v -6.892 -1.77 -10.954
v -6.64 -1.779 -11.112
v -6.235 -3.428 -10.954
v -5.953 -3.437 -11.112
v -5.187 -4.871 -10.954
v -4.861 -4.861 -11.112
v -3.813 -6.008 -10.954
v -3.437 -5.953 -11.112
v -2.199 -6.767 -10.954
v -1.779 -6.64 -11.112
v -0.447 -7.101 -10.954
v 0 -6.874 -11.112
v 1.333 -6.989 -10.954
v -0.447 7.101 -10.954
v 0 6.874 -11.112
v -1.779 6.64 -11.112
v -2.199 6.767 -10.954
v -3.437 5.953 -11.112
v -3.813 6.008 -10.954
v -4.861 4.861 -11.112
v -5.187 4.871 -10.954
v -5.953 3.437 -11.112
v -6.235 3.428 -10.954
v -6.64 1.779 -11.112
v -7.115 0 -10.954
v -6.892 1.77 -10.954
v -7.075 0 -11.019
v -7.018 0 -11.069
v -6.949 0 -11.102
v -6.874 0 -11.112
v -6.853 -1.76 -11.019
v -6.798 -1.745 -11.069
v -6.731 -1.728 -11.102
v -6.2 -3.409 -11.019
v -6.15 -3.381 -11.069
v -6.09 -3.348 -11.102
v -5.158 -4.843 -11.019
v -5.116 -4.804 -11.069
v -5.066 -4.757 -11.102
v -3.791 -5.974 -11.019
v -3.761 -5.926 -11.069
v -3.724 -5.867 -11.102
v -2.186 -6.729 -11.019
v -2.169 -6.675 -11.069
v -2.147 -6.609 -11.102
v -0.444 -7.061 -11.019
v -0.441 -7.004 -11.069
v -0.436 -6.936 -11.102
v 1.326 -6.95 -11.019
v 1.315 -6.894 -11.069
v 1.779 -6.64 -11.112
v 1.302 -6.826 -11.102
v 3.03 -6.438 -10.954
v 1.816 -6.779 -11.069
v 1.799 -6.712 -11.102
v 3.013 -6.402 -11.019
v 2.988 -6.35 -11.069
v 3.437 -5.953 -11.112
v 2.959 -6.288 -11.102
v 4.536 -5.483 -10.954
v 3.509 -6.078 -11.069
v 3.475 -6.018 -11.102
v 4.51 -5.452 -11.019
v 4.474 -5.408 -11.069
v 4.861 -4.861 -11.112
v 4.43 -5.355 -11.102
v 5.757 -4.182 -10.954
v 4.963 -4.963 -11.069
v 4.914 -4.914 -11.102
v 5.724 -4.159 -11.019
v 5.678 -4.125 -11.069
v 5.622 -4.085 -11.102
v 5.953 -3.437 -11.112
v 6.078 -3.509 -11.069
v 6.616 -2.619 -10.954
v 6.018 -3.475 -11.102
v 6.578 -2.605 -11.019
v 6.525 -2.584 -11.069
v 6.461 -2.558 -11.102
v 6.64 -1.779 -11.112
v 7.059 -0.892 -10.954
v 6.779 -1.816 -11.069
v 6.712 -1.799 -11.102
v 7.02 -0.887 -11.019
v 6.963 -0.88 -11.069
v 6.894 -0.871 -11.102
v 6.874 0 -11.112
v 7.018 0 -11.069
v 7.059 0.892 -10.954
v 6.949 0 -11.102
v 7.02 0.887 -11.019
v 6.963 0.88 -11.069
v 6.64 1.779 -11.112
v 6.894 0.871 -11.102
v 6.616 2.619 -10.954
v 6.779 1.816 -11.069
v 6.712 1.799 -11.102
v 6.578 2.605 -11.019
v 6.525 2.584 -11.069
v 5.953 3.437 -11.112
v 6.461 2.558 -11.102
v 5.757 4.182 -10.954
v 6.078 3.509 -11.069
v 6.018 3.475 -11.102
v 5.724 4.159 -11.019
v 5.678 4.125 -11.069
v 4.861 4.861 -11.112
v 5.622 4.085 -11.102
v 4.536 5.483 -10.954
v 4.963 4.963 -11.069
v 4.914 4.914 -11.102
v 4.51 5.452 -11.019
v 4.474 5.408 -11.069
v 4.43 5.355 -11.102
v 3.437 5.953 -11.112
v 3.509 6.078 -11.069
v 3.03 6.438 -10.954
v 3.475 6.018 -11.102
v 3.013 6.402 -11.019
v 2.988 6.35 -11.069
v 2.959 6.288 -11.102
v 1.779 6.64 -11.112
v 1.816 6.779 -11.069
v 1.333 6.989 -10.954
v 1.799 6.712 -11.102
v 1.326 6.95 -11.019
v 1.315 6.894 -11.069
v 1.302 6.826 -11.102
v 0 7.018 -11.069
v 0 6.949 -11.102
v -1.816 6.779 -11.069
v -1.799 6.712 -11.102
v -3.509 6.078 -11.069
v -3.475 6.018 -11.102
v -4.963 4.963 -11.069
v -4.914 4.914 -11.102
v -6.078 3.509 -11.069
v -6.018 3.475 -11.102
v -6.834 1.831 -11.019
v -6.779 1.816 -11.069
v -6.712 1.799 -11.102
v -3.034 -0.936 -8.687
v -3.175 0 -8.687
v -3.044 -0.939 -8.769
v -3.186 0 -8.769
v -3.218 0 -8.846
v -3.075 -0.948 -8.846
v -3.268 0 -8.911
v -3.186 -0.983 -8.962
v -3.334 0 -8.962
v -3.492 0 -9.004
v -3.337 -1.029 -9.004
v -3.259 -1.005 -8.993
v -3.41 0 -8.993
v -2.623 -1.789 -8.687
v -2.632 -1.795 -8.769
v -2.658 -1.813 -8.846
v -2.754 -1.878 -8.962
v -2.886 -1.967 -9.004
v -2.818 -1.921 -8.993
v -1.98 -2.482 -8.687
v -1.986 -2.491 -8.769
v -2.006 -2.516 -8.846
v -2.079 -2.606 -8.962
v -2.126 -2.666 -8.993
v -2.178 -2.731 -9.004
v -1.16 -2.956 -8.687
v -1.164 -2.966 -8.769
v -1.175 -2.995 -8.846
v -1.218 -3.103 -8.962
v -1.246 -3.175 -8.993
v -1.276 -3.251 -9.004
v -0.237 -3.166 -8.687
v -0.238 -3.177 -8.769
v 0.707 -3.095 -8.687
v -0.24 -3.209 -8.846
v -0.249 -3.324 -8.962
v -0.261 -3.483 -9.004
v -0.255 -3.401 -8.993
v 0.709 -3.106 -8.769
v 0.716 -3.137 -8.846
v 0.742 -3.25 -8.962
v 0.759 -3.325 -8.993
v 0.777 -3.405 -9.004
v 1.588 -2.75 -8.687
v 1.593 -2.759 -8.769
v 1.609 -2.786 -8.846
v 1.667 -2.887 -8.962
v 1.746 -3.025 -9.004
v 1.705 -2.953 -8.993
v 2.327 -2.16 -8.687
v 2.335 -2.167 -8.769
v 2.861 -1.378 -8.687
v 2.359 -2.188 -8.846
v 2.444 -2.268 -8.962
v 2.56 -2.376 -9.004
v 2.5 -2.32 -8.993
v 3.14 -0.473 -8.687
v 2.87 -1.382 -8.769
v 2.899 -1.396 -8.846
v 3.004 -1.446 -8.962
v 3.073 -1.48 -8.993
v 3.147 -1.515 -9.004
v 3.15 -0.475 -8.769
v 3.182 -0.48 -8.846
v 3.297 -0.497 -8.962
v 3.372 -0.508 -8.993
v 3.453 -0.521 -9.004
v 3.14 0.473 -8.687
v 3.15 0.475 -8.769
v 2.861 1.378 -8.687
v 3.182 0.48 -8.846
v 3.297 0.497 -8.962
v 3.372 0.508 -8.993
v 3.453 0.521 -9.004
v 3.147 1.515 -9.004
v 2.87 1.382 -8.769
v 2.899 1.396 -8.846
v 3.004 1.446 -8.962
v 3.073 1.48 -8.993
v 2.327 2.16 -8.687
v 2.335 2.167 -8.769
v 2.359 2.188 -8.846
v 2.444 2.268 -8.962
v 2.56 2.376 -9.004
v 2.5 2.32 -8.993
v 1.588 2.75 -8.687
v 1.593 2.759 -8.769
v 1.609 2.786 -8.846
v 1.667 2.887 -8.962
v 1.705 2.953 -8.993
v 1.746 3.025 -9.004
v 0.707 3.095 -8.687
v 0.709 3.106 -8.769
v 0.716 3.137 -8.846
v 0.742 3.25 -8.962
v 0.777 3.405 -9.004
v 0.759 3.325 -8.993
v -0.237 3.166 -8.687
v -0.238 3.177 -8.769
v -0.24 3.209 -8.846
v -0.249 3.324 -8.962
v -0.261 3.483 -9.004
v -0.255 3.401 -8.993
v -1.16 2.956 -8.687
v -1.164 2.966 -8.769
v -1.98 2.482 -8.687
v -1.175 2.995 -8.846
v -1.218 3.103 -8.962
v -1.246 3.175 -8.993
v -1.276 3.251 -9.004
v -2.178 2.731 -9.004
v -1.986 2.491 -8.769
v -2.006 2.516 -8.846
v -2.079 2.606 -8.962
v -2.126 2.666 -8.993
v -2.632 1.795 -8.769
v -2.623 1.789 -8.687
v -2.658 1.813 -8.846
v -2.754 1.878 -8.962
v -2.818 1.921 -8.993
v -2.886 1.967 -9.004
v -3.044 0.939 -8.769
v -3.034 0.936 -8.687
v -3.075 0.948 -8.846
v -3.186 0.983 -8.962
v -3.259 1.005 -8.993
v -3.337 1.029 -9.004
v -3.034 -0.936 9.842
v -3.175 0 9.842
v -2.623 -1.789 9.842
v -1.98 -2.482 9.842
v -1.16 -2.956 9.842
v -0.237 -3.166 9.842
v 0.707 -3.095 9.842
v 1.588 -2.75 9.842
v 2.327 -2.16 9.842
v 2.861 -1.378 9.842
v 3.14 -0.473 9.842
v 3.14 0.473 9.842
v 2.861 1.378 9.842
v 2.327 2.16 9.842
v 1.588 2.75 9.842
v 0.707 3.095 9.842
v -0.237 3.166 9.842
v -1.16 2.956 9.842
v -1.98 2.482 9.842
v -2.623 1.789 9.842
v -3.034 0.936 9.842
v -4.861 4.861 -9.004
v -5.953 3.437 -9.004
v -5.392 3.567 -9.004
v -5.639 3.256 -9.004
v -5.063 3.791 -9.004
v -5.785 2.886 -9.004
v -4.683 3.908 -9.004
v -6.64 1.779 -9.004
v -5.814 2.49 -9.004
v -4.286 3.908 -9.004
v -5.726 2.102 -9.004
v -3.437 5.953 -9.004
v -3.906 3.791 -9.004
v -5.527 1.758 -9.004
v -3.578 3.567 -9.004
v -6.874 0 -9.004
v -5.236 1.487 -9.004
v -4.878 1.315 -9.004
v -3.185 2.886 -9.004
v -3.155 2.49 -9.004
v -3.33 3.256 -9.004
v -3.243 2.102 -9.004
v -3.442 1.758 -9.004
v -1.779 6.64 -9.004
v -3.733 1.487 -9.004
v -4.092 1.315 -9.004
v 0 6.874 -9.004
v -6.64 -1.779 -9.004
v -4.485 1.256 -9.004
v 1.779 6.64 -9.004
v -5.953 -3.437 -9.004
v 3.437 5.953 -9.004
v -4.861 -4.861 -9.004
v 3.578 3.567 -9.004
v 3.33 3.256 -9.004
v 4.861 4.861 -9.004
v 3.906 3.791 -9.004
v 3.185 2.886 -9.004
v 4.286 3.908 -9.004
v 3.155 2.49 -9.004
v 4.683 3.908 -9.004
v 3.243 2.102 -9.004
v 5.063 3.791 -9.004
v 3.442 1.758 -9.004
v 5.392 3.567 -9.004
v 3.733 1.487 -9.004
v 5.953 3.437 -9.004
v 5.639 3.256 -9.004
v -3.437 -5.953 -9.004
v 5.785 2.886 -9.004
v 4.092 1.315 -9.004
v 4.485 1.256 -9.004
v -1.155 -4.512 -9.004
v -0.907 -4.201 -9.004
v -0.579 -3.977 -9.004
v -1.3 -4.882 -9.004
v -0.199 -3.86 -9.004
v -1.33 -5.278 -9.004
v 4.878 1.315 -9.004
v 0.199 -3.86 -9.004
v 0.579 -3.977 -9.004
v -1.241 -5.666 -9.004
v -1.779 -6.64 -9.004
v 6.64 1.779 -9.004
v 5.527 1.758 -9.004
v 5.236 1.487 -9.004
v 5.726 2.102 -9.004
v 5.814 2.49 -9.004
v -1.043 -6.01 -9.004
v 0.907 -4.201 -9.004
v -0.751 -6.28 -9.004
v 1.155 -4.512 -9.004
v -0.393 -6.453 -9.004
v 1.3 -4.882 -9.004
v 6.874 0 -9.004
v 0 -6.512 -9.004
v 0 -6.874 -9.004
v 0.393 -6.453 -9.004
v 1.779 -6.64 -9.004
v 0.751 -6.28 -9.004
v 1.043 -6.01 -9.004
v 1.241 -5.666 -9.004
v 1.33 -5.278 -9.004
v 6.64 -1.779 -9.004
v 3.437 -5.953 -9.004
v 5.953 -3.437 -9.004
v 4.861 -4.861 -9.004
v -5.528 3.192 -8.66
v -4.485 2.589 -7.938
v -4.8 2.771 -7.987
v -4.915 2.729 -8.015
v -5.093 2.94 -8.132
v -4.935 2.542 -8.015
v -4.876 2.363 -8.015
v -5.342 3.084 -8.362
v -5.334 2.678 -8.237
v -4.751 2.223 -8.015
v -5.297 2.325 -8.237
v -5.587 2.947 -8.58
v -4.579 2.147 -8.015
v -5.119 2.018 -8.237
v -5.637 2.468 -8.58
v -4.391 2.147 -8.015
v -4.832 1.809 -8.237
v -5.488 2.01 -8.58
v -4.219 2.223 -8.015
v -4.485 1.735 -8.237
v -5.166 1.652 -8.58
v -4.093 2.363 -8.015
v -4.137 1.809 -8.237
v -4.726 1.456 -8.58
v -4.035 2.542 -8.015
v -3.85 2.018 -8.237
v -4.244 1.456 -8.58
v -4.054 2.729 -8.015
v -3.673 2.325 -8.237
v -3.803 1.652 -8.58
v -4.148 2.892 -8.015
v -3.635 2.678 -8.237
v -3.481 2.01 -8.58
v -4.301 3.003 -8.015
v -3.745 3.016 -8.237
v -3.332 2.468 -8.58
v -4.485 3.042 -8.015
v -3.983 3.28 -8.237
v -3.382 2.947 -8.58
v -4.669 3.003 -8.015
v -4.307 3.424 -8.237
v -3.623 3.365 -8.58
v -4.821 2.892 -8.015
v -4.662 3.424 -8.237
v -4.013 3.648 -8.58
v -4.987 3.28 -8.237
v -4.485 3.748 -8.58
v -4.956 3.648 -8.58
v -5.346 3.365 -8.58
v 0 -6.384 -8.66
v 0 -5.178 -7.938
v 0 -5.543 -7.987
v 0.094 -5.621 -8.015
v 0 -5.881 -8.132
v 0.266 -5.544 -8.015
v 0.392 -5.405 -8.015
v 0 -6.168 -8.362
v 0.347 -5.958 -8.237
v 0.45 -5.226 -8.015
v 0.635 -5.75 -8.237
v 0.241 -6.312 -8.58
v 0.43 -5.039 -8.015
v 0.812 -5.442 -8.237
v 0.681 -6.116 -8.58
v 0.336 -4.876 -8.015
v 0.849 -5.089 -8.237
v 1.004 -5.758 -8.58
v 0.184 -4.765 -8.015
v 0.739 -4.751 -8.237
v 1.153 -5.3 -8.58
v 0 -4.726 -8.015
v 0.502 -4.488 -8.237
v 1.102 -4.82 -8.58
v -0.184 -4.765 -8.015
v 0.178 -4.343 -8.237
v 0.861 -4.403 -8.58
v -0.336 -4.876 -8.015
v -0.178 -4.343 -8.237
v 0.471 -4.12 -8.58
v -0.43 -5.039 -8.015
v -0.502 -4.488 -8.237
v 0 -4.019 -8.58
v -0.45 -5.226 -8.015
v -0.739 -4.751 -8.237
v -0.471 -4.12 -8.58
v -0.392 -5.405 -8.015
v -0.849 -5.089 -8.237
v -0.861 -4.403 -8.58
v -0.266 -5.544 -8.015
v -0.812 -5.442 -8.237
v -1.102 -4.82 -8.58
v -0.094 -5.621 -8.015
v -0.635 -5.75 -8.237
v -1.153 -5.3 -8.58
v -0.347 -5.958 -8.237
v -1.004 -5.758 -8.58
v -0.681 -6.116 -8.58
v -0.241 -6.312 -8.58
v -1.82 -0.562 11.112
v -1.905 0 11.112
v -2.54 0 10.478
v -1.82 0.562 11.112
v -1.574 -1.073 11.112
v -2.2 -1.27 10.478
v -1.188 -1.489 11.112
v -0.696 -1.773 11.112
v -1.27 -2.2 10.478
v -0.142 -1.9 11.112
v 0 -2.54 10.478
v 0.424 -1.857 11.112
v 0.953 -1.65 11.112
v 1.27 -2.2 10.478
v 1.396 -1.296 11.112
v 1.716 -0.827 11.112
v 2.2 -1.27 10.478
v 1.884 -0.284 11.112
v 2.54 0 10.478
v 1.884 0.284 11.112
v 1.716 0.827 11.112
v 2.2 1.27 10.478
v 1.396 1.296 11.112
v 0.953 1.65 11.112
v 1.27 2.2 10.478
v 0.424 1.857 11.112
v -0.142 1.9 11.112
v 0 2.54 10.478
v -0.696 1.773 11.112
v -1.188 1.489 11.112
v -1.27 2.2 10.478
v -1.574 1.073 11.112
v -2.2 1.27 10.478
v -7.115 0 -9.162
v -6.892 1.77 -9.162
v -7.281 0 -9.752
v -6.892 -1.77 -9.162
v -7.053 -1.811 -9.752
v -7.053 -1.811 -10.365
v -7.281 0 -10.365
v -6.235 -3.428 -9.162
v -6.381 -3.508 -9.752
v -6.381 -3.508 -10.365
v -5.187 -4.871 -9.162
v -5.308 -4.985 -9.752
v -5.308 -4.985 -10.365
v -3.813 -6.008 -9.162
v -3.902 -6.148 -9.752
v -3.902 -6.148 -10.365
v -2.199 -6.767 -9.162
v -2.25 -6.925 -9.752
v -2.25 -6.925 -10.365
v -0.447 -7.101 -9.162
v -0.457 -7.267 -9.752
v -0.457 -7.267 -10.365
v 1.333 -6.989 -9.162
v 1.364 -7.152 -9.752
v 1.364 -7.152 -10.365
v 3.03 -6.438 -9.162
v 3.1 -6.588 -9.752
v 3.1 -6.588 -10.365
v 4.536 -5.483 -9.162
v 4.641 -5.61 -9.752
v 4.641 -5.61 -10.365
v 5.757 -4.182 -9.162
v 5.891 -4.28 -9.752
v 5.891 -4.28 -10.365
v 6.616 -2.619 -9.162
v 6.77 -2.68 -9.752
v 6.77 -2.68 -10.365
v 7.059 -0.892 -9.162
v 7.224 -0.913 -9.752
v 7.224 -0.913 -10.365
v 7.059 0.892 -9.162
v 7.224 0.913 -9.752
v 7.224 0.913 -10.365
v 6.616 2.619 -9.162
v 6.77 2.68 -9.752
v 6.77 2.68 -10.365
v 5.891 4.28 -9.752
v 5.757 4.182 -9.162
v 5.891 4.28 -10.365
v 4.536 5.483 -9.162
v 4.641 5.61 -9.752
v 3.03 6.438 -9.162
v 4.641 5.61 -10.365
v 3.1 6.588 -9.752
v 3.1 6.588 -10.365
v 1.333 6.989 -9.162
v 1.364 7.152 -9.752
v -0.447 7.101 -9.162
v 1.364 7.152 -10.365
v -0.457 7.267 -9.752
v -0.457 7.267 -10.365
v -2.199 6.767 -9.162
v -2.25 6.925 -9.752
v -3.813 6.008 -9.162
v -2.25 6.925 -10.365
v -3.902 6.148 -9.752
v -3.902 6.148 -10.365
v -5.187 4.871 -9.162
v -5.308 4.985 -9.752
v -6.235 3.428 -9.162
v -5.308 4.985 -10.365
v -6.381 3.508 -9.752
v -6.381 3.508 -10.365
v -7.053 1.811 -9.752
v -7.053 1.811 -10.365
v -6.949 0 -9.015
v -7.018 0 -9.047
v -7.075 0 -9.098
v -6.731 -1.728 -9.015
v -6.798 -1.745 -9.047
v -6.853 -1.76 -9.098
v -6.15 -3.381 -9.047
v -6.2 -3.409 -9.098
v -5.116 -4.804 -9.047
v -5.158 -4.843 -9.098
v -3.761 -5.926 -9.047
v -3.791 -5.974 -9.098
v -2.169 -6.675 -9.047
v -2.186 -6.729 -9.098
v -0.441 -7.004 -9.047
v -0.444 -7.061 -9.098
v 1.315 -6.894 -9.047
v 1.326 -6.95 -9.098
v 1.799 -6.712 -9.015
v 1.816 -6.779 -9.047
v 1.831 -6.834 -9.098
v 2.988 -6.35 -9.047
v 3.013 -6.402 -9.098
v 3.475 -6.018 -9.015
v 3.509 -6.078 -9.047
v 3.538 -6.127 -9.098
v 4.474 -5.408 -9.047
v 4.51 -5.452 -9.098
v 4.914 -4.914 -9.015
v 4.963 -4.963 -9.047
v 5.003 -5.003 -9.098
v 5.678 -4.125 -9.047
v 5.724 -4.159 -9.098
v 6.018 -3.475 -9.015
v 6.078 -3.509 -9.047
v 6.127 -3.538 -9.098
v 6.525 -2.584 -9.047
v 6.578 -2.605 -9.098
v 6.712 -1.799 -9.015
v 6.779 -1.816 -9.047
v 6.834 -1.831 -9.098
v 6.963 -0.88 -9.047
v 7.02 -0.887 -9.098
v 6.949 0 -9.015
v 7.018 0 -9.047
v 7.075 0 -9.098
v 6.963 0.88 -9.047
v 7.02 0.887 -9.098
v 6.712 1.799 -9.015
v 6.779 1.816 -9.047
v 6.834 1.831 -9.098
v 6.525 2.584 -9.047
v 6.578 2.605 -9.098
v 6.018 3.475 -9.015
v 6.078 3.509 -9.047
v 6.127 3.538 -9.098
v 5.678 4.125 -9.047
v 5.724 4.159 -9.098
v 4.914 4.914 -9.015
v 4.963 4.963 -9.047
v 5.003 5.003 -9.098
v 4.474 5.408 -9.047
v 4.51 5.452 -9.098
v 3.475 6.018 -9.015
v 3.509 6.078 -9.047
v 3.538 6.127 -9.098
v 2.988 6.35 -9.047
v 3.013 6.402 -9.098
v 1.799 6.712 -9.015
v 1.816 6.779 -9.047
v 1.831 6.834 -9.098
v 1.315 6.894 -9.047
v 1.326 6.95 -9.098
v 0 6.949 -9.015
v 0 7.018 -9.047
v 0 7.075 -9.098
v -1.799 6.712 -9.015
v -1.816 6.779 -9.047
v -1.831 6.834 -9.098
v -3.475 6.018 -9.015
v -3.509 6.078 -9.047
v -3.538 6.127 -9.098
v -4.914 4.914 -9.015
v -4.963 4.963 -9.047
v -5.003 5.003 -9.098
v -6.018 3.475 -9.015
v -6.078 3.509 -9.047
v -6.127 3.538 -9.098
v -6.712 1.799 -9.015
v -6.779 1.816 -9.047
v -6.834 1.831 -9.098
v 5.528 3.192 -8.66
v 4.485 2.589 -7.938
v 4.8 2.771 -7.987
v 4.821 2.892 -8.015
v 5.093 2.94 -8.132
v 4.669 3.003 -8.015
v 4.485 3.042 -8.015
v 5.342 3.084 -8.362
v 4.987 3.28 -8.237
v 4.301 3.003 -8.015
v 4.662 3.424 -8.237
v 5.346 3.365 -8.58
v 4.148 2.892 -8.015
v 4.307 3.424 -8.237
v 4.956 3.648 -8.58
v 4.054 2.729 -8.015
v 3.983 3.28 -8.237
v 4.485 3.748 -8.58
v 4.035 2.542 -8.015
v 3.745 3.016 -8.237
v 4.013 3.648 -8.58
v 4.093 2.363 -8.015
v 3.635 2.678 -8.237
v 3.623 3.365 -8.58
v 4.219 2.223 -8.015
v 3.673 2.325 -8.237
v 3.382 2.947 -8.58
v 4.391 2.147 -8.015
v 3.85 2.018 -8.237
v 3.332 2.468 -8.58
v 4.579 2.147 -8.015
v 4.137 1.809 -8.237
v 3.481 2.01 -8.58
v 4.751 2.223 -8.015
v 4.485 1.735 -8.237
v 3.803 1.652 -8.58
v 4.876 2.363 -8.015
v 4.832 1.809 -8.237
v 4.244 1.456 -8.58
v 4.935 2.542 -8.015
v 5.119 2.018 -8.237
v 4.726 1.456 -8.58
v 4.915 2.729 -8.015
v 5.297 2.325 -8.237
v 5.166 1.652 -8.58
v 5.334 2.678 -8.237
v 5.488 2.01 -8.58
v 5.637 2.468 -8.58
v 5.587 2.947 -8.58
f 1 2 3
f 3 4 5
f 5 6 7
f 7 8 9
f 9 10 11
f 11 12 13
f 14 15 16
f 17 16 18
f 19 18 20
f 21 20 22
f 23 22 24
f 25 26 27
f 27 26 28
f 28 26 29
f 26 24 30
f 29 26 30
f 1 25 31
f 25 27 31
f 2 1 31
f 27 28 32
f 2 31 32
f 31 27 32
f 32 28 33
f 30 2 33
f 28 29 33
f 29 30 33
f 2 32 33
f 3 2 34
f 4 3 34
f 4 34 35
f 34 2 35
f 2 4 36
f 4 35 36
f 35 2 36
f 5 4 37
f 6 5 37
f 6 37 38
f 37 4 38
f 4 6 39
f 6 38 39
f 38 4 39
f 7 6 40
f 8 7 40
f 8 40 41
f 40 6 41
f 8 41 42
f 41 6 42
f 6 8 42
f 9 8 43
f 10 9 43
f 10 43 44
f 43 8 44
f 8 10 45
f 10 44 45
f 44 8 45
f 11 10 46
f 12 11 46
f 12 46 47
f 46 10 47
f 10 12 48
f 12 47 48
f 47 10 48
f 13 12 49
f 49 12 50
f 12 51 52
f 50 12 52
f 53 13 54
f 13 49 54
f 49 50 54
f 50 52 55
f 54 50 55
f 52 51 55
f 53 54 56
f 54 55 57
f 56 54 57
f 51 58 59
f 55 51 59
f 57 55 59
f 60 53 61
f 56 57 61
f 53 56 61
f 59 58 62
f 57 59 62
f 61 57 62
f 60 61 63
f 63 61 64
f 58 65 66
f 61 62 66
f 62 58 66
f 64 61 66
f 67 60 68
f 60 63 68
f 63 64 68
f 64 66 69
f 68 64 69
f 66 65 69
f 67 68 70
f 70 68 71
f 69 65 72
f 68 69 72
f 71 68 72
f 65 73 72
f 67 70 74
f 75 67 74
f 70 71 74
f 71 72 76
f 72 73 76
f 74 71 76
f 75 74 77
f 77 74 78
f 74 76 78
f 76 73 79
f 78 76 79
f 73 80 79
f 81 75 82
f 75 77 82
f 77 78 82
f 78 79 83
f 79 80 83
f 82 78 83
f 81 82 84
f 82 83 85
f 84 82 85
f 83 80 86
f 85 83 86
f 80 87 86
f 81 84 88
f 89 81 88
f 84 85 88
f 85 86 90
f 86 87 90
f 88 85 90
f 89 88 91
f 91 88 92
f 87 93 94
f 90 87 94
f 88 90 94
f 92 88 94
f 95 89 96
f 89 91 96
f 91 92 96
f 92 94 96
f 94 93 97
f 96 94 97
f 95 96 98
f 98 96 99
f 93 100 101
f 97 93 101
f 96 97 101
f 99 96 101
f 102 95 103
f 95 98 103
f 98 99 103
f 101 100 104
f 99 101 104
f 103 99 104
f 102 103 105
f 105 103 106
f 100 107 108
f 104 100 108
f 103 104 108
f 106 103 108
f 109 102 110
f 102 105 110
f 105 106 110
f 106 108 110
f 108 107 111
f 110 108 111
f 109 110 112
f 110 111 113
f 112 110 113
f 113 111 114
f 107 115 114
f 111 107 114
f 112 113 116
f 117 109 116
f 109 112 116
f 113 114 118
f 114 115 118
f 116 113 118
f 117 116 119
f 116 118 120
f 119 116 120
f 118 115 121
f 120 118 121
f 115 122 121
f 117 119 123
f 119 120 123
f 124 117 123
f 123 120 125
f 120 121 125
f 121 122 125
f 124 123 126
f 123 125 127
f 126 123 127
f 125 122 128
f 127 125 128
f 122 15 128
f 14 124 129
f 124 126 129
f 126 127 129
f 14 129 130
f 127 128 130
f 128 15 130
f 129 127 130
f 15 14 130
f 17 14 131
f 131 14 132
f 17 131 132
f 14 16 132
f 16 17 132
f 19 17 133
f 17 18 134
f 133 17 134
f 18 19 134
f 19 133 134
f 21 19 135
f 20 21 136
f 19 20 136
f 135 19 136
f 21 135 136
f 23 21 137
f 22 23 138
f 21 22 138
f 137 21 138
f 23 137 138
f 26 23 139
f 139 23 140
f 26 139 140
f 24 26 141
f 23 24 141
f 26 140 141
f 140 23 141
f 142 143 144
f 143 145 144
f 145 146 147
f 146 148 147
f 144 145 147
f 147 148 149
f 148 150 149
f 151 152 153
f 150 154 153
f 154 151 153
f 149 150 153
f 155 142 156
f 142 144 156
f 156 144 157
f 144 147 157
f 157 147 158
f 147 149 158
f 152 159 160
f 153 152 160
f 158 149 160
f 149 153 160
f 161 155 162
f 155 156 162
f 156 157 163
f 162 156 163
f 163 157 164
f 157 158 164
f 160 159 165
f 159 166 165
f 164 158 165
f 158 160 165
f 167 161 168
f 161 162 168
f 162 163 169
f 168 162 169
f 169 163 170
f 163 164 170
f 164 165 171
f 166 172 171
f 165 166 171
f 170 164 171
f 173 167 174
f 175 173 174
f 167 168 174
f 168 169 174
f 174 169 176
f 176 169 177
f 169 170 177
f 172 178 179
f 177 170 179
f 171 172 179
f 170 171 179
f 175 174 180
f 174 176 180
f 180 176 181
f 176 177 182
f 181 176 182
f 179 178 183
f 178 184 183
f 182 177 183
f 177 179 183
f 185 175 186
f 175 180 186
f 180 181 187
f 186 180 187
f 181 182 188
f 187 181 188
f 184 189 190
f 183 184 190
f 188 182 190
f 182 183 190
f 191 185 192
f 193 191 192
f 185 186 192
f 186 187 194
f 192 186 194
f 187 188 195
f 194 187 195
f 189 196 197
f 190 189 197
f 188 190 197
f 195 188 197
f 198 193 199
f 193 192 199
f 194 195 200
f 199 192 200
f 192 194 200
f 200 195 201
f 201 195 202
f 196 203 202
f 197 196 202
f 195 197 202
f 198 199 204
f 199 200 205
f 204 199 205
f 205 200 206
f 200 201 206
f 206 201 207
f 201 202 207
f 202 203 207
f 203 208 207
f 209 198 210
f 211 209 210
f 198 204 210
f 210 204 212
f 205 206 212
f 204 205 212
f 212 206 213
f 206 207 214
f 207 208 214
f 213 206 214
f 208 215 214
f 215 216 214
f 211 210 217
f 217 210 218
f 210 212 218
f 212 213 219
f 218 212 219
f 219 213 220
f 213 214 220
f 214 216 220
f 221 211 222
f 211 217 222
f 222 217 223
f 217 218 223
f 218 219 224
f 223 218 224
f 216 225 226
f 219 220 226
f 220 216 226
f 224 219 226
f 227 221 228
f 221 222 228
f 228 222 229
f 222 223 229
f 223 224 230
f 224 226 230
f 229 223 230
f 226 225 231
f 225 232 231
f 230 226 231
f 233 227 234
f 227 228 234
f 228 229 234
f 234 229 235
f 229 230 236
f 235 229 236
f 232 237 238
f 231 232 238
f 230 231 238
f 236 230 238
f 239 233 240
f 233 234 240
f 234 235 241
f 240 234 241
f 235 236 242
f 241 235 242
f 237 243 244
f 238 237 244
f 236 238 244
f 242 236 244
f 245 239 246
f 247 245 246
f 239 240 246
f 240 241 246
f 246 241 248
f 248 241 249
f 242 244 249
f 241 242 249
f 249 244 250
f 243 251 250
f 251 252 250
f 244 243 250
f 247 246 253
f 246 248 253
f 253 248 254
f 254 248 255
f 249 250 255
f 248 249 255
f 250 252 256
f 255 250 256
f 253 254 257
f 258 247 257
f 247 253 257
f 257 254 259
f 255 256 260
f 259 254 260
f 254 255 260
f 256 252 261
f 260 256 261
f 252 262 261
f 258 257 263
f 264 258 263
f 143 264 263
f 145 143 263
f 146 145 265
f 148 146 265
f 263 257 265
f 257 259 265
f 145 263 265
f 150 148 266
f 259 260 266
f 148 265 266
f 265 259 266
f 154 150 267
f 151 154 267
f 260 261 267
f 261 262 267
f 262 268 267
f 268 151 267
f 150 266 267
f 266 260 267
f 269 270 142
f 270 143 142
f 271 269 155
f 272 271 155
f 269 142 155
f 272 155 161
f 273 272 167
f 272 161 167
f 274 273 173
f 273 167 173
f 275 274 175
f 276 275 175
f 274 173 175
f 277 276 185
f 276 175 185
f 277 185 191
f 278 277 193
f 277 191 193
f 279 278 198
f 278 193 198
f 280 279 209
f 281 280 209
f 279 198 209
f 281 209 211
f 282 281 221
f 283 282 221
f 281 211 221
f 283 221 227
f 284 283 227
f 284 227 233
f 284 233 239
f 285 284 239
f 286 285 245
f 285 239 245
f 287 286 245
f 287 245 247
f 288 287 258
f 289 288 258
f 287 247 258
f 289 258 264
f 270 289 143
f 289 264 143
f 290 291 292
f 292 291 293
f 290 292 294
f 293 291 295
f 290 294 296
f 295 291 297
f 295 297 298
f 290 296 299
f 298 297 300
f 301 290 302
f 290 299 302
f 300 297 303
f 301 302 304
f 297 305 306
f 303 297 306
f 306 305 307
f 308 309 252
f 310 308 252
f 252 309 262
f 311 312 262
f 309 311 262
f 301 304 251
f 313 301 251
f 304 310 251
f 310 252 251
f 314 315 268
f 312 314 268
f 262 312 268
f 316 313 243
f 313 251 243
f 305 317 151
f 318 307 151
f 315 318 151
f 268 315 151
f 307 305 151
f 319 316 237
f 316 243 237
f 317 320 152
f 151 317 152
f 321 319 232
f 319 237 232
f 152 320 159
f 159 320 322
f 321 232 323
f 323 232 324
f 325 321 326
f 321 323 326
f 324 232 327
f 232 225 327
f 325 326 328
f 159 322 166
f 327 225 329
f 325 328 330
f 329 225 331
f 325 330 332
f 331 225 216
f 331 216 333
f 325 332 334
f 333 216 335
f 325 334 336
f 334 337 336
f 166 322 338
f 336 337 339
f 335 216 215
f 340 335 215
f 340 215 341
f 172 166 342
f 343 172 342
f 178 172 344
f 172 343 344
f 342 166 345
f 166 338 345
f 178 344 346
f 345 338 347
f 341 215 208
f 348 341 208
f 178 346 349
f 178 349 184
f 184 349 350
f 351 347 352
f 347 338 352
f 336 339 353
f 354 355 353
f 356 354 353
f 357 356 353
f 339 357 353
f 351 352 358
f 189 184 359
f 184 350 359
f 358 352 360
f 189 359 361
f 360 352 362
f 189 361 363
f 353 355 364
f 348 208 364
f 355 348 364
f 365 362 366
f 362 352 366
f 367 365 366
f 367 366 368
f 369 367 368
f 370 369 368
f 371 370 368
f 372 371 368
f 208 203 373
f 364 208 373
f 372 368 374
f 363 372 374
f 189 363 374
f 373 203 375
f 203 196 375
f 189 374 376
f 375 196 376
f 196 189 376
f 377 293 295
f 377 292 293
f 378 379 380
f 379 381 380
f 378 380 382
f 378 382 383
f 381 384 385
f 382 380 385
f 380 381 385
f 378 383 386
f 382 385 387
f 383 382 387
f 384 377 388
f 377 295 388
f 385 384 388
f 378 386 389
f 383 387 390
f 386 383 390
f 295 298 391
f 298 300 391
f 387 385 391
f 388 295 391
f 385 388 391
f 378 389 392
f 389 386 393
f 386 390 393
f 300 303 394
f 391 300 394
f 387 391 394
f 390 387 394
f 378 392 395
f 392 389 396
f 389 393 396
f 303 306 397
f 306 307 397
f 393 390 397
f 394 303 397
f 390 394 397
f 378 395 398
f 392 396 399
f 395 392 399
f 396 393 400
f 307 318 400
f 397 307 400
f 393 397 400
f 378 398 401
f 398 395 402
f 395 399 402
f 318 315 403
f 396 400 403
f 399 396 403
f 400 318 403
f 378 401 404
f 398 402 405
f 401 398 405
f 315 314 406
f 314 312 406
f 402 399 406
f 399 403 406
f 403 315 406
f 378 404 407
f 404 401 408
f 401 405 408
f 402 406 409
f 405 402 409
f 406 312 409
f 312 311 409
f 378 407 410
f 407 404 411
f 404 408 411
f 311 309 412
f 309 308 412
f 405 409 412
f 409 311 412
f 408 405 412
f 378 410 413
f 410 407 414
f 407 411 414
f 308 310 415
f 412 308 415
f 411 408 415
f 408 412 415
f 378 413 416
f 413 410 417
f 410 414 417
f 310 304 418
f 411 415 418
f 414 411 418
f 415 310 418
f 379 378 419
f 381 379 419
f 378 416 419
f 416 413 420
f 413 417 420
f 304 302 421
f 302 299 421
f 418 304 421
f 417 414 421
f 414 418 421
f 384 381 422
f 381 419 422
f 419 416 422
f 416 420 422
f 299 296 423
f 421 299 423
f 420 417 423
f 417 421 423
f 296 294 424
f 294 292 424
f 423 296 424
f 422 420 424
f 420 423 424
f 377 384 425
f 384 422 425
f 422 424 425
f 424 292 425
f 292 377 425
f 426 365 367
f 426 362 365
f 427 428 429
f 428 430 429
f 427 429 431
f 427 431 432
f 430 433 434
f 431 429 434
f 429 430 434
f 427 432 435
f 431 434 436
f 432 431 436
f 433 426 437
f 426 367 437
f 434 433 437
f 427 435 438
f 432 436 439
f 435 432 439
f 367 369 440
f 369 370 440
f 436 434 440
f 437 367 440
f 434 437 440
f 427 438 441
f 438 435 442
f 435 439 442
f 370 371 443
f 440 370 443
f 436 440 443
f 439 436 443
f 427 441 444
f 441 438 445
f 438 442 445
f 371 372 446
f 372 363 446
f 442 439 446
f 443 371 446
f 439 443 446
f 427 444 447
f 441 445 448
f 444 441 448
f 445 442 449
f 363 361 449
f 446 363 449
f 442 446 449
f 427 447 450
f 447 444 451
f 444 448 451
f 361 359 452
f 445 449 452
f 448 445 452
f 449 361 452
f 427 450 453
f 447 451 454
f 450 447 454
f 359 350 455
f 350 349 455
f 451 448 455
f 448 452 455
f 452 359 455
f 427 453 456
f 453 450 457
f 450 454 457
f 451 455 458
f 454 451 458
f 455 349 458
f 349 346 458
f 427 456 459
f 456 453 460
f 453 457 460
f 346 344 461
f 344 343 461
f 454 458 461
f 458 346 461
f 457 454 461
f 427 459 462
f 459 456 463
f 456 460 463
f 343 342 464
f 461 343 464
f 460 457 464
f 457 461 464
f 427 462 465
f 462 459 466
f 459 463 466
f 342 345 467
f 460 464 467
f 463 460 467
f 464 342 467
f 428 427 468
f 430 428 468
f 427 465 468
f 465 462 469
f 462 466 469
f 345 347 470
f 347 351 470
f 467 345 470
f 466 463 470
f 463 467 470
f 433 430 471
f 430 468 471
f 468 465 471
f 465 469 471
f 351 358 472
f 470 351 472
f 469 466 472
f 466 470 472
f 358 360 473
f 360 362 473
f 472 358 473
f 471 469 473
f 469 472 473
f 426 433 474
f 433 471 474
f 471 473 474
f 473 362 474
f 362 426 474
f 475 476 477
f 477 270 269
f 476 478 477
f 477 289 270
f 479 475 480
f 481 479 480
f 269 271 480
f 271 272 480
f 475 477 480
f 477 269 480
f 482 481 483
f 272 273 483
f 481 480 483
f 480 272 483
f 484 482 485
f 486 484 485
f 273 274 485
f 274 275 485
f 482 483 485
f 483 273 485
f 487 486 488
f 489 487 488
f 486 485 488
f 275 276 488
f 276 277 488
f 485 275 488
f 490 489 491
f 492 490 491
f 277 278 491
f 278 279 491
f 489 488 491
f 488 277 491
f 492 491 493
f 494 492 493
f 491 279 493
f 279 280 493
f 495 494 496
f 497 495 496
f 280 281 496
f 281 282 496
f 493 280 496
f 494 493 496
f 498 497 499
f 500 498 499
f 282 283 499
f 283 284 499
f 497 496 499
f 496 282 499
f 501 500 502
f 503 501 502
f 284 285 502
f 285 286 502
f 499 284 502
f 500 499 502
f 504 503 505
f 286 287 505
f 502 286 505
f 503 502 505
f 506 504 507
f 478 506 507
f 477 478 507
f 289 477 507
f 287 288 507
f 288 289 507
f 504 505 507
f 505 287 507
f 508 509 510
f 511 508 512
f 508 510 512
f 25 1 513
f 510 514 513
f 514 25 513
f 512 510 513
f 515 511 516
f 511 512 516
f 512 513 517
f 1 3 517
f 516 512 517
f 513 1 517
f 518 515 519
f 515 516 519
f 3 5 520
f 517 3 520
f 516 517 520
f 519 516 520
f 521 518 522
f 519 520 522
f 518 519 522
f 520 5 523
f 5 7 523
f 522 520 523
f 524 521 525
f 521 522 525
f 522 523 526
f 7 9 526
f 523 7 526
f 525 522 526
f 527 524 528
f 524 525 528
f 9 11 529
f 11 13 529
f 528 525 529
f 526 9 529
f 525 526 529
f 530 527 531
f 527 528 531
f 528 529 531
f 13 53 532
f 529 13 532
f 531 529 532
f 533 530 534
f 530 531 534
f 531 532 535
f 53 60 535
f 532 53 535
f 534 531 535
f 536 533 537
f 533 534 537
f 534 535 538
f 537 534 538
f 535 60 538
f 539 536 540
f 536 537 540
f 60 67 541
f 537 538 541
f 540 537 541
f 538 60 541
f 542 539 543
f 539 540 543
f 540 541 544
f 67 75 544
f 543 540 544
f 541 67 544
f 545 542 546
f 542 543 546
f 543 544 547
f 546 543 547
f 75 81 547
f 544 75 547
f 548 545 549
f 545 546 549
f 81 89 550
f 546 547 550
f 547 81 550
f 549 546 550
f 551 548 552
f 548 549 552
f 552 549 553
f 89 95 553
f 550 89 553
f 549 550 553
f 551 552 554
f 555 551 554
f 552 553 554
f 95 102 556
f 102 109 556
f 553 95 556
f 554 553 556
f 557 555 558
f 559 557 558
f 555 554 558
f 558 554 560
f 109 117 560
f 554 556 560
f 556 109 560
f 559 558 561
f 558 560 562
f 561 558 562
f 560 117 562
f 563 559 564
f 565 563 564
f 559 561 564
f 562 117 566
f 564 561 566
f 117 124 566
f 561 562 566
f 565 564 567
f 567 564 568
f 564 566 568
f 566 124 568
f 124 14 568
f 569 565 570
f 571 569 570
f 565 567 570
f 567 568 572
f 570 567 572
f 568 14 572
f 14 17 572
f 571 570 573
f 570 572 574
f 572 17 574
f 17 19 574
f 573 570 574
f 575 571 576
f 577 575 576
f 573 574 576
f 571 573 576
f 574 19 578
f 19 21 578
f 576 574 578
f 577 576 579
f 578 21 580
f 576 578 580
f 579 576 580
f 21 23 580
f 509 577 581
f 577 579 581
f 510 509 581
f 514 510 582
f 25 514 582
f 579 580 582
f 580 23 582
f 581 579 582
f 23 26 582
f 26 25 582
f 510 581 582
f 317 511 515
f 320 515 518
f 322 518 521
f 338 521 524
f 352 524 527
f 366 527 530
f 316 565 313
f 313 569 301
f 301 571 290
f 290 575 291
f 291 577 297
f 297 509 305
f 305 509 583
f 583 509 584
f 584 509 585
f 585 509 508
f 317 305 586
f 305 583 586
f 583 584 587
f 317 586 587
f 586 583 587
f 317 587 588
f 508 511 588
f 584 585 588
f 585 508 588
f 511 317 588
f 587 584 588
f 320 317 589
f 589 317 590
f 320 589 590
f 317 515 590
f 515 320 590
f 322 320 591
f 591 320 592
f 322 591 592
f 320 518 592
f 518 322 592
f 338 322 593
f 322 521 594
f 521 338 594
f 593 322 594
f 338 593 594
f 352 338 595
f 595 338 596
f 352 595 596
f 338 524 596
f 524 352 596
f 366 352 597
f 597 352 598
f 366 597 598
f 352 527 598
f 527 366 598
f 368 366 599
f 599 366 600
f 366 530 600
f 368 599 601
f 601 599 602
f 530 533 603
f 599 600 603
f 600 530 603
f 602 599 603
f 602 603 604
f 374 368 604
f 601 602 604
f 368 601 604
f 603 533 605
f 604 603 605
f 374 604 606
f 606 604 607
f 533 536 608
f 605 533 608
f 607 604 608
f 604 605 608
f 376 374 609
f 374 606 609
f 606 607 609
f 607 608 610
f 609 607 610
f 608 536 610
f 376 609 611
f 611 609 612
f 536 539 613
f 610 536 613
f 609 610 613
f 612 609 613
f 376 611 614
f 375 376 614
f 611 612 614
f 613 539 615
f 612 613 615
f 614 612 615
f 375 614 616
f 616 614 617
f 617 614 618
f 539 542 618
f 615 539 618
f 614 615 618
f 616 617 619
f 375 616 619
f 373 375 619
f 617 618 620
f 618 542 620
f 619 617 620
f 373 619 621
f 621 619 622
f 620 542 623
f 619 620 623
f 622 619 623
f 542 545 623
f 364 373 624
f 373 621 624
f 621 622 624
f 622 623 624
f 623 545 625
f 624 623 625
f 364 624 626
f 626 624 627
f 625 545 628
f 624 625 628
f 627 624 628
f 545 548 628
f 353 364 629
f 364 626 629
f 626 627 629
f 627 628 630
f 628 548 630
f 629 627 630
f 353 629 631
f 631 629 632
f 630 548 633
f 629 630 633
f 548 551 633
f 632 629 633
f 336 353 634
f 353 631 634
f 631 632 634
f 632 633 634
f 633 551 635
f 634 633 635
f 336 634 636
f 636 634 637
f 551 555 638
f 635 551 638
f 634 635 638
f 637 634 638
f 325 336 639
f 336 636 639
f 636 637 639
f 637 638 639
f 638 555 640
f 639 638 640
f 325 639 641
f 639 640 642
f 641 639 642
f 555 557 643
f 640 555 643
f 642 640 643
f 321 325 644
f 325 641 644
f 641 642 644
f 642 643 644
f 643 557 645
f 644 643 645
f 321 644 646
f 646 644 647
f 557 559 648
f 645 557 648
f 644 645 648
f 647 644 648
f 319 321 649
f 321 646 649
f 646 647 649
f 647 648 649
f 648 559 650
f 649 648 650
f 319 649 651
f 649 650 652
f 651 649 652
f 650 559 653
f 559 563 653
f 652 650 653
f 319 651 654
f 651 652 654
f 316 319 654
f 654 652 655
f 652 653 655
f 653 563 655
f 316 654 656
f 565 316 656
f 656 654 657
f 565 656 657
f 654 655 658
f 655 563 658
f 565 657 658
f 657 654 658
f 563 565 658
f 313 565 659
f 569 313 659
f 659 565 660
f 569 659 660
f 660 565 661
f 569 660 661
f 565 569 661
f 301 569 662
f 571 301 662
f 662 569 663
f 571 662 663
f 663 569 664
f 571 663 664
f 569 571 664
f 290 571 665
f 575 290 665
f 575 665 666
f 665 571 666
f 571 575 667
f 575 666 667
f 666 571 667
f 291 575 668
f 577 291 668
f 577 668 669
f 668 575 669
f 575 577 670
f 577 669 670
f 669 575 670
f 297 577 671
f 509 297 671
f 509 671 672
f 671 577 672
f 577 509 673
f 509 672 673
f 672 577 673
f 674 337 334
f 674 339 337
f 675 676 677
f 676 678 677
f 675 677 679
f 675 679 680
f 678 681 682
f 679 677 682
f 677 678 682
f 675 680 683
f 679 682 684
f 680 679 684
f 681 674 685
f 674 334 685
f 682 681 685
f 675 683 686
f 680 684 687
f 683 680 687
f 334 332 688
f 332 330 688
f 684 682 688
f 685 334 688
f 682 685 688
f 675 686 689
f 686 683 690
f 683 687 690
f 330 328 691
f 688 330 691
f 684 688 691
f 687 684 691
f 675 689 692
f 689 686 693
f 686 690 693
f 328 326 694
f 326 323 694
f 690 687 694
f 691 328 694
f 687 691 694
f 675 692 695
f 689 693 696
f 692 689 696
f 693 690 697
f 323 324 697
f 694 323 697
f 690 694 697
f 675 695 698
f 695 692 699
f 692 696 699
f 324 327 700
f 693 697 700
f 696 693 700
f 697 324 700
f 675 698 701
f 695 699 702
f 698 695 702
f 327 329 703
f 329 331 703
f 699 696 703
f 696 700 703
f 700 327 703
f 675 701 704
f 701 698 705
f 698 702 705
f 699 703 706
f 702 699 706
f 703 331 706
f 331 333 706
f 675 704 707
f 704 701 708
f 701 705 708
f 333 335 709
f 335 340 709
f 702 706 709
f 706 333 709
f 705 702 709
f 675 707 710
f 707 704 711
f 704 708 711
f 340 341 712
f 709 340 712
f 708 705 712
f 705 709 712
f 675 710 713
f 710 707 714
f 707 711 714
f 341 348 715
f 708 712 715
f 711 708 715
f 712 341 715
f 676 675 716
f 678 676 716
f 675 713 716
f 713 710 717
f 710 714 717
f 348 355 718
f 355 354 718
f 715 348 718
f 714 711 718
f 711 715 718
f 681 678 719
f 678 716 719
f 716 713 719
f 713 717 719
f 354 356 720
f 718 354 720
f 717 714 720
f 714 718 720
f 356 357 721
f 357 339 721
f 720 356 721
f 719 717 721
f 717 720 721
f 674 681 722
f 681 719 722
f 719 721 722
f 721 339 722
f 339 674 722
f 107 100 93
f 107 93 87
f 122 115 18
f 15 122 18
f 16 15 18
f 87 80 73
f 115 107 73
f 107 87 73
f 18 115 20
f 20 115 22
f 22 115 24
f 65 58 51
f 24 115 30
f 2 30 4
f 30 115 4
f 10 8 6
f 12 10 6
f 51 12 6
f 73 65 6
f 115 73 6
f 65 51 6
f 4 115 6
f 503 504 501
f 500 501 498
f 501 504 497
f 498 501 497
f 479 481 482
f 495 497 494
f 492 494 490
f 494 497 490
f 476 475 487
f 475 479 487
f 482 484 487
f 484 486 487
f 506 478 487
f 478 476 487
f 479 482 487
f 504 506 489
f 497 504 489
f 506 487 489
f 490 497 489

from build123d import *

# Parameters (mm, degrees)
CIRPATTERN1_COUNT = 3


with BuildPart() as part:
    # Sketch2 → Revolve1 (revolve)
    with BuildSketch(Plane(origin=(0, 0, 0), x_dir=(0, 0, -1), z_dir=(1, 0, 0))):
        with BuildLine():
            Line((9.0043, 3.4925), (9.0043, 6.87397239))
            ThreePointArc((9.0043, 6.87397239), (9.047344167, 7.018310977), (9.162415, 7.115497042))
            ThreePointArc((9.162415, 7.115497042), (10.0584, 7.3025), (10.954385, 7.115497042))
            ThreePointArc((10.954385, 7.115497042), (11.069455833, 7.018310977), (11.1125, 6.87397239))
            Line((11.1125, 6.87397239), (11.1125, 0))
            Line((11.1125, 0), (-11.1125, 0))
            Line((-11.1125, 0), (-11.1125, 1.905))
            Line((-11.1125, 1.905), (-9.8425, 3.175))
            Line((-9.8425, 3.175), (8.6868, 3.175))
            ThreePointArc((8.6868, 3.175), (8.911306403, 3.267993597), (9.0043, 3.4925))
        make_face()
    revolve(axis=Axis((0, 0, -11.1125), (0, 0, 1)))

    # Sketch4 → Revolve2 (revolve)
    with BuildSketch(Plane(origin=(0, 0, 0), x_dir=(0, 0, -1), z_dir=(1, 0, 0))):
        with BuildLine():
            Line((9.0043, -6.511925), (9.0043, -5.178425))
            Line((9.0043, -5.178425), (7.9375, -5.178425))
            ThreePointArc((7.9375, -5.178425), (8.237016729, -6.032281617), (9.0043, -6.511925))
        make_face()
    revolve2 = revolve(axis=Axis((0, -5.178425, -9.0043), (0, 0, 1)))

    # CirPattern1: Revolve2 ×3 about axis
    cirpattern1_axis = Axis((0, 0, -11.1125), (0, 0, 1))
    for i in range(1, CIRPATTERN1_COUNT):
        add(revolve2.rotate(cirpattern1_axis, i * 360 / CIRPATTERN1_COUNT))


solid = part.part
